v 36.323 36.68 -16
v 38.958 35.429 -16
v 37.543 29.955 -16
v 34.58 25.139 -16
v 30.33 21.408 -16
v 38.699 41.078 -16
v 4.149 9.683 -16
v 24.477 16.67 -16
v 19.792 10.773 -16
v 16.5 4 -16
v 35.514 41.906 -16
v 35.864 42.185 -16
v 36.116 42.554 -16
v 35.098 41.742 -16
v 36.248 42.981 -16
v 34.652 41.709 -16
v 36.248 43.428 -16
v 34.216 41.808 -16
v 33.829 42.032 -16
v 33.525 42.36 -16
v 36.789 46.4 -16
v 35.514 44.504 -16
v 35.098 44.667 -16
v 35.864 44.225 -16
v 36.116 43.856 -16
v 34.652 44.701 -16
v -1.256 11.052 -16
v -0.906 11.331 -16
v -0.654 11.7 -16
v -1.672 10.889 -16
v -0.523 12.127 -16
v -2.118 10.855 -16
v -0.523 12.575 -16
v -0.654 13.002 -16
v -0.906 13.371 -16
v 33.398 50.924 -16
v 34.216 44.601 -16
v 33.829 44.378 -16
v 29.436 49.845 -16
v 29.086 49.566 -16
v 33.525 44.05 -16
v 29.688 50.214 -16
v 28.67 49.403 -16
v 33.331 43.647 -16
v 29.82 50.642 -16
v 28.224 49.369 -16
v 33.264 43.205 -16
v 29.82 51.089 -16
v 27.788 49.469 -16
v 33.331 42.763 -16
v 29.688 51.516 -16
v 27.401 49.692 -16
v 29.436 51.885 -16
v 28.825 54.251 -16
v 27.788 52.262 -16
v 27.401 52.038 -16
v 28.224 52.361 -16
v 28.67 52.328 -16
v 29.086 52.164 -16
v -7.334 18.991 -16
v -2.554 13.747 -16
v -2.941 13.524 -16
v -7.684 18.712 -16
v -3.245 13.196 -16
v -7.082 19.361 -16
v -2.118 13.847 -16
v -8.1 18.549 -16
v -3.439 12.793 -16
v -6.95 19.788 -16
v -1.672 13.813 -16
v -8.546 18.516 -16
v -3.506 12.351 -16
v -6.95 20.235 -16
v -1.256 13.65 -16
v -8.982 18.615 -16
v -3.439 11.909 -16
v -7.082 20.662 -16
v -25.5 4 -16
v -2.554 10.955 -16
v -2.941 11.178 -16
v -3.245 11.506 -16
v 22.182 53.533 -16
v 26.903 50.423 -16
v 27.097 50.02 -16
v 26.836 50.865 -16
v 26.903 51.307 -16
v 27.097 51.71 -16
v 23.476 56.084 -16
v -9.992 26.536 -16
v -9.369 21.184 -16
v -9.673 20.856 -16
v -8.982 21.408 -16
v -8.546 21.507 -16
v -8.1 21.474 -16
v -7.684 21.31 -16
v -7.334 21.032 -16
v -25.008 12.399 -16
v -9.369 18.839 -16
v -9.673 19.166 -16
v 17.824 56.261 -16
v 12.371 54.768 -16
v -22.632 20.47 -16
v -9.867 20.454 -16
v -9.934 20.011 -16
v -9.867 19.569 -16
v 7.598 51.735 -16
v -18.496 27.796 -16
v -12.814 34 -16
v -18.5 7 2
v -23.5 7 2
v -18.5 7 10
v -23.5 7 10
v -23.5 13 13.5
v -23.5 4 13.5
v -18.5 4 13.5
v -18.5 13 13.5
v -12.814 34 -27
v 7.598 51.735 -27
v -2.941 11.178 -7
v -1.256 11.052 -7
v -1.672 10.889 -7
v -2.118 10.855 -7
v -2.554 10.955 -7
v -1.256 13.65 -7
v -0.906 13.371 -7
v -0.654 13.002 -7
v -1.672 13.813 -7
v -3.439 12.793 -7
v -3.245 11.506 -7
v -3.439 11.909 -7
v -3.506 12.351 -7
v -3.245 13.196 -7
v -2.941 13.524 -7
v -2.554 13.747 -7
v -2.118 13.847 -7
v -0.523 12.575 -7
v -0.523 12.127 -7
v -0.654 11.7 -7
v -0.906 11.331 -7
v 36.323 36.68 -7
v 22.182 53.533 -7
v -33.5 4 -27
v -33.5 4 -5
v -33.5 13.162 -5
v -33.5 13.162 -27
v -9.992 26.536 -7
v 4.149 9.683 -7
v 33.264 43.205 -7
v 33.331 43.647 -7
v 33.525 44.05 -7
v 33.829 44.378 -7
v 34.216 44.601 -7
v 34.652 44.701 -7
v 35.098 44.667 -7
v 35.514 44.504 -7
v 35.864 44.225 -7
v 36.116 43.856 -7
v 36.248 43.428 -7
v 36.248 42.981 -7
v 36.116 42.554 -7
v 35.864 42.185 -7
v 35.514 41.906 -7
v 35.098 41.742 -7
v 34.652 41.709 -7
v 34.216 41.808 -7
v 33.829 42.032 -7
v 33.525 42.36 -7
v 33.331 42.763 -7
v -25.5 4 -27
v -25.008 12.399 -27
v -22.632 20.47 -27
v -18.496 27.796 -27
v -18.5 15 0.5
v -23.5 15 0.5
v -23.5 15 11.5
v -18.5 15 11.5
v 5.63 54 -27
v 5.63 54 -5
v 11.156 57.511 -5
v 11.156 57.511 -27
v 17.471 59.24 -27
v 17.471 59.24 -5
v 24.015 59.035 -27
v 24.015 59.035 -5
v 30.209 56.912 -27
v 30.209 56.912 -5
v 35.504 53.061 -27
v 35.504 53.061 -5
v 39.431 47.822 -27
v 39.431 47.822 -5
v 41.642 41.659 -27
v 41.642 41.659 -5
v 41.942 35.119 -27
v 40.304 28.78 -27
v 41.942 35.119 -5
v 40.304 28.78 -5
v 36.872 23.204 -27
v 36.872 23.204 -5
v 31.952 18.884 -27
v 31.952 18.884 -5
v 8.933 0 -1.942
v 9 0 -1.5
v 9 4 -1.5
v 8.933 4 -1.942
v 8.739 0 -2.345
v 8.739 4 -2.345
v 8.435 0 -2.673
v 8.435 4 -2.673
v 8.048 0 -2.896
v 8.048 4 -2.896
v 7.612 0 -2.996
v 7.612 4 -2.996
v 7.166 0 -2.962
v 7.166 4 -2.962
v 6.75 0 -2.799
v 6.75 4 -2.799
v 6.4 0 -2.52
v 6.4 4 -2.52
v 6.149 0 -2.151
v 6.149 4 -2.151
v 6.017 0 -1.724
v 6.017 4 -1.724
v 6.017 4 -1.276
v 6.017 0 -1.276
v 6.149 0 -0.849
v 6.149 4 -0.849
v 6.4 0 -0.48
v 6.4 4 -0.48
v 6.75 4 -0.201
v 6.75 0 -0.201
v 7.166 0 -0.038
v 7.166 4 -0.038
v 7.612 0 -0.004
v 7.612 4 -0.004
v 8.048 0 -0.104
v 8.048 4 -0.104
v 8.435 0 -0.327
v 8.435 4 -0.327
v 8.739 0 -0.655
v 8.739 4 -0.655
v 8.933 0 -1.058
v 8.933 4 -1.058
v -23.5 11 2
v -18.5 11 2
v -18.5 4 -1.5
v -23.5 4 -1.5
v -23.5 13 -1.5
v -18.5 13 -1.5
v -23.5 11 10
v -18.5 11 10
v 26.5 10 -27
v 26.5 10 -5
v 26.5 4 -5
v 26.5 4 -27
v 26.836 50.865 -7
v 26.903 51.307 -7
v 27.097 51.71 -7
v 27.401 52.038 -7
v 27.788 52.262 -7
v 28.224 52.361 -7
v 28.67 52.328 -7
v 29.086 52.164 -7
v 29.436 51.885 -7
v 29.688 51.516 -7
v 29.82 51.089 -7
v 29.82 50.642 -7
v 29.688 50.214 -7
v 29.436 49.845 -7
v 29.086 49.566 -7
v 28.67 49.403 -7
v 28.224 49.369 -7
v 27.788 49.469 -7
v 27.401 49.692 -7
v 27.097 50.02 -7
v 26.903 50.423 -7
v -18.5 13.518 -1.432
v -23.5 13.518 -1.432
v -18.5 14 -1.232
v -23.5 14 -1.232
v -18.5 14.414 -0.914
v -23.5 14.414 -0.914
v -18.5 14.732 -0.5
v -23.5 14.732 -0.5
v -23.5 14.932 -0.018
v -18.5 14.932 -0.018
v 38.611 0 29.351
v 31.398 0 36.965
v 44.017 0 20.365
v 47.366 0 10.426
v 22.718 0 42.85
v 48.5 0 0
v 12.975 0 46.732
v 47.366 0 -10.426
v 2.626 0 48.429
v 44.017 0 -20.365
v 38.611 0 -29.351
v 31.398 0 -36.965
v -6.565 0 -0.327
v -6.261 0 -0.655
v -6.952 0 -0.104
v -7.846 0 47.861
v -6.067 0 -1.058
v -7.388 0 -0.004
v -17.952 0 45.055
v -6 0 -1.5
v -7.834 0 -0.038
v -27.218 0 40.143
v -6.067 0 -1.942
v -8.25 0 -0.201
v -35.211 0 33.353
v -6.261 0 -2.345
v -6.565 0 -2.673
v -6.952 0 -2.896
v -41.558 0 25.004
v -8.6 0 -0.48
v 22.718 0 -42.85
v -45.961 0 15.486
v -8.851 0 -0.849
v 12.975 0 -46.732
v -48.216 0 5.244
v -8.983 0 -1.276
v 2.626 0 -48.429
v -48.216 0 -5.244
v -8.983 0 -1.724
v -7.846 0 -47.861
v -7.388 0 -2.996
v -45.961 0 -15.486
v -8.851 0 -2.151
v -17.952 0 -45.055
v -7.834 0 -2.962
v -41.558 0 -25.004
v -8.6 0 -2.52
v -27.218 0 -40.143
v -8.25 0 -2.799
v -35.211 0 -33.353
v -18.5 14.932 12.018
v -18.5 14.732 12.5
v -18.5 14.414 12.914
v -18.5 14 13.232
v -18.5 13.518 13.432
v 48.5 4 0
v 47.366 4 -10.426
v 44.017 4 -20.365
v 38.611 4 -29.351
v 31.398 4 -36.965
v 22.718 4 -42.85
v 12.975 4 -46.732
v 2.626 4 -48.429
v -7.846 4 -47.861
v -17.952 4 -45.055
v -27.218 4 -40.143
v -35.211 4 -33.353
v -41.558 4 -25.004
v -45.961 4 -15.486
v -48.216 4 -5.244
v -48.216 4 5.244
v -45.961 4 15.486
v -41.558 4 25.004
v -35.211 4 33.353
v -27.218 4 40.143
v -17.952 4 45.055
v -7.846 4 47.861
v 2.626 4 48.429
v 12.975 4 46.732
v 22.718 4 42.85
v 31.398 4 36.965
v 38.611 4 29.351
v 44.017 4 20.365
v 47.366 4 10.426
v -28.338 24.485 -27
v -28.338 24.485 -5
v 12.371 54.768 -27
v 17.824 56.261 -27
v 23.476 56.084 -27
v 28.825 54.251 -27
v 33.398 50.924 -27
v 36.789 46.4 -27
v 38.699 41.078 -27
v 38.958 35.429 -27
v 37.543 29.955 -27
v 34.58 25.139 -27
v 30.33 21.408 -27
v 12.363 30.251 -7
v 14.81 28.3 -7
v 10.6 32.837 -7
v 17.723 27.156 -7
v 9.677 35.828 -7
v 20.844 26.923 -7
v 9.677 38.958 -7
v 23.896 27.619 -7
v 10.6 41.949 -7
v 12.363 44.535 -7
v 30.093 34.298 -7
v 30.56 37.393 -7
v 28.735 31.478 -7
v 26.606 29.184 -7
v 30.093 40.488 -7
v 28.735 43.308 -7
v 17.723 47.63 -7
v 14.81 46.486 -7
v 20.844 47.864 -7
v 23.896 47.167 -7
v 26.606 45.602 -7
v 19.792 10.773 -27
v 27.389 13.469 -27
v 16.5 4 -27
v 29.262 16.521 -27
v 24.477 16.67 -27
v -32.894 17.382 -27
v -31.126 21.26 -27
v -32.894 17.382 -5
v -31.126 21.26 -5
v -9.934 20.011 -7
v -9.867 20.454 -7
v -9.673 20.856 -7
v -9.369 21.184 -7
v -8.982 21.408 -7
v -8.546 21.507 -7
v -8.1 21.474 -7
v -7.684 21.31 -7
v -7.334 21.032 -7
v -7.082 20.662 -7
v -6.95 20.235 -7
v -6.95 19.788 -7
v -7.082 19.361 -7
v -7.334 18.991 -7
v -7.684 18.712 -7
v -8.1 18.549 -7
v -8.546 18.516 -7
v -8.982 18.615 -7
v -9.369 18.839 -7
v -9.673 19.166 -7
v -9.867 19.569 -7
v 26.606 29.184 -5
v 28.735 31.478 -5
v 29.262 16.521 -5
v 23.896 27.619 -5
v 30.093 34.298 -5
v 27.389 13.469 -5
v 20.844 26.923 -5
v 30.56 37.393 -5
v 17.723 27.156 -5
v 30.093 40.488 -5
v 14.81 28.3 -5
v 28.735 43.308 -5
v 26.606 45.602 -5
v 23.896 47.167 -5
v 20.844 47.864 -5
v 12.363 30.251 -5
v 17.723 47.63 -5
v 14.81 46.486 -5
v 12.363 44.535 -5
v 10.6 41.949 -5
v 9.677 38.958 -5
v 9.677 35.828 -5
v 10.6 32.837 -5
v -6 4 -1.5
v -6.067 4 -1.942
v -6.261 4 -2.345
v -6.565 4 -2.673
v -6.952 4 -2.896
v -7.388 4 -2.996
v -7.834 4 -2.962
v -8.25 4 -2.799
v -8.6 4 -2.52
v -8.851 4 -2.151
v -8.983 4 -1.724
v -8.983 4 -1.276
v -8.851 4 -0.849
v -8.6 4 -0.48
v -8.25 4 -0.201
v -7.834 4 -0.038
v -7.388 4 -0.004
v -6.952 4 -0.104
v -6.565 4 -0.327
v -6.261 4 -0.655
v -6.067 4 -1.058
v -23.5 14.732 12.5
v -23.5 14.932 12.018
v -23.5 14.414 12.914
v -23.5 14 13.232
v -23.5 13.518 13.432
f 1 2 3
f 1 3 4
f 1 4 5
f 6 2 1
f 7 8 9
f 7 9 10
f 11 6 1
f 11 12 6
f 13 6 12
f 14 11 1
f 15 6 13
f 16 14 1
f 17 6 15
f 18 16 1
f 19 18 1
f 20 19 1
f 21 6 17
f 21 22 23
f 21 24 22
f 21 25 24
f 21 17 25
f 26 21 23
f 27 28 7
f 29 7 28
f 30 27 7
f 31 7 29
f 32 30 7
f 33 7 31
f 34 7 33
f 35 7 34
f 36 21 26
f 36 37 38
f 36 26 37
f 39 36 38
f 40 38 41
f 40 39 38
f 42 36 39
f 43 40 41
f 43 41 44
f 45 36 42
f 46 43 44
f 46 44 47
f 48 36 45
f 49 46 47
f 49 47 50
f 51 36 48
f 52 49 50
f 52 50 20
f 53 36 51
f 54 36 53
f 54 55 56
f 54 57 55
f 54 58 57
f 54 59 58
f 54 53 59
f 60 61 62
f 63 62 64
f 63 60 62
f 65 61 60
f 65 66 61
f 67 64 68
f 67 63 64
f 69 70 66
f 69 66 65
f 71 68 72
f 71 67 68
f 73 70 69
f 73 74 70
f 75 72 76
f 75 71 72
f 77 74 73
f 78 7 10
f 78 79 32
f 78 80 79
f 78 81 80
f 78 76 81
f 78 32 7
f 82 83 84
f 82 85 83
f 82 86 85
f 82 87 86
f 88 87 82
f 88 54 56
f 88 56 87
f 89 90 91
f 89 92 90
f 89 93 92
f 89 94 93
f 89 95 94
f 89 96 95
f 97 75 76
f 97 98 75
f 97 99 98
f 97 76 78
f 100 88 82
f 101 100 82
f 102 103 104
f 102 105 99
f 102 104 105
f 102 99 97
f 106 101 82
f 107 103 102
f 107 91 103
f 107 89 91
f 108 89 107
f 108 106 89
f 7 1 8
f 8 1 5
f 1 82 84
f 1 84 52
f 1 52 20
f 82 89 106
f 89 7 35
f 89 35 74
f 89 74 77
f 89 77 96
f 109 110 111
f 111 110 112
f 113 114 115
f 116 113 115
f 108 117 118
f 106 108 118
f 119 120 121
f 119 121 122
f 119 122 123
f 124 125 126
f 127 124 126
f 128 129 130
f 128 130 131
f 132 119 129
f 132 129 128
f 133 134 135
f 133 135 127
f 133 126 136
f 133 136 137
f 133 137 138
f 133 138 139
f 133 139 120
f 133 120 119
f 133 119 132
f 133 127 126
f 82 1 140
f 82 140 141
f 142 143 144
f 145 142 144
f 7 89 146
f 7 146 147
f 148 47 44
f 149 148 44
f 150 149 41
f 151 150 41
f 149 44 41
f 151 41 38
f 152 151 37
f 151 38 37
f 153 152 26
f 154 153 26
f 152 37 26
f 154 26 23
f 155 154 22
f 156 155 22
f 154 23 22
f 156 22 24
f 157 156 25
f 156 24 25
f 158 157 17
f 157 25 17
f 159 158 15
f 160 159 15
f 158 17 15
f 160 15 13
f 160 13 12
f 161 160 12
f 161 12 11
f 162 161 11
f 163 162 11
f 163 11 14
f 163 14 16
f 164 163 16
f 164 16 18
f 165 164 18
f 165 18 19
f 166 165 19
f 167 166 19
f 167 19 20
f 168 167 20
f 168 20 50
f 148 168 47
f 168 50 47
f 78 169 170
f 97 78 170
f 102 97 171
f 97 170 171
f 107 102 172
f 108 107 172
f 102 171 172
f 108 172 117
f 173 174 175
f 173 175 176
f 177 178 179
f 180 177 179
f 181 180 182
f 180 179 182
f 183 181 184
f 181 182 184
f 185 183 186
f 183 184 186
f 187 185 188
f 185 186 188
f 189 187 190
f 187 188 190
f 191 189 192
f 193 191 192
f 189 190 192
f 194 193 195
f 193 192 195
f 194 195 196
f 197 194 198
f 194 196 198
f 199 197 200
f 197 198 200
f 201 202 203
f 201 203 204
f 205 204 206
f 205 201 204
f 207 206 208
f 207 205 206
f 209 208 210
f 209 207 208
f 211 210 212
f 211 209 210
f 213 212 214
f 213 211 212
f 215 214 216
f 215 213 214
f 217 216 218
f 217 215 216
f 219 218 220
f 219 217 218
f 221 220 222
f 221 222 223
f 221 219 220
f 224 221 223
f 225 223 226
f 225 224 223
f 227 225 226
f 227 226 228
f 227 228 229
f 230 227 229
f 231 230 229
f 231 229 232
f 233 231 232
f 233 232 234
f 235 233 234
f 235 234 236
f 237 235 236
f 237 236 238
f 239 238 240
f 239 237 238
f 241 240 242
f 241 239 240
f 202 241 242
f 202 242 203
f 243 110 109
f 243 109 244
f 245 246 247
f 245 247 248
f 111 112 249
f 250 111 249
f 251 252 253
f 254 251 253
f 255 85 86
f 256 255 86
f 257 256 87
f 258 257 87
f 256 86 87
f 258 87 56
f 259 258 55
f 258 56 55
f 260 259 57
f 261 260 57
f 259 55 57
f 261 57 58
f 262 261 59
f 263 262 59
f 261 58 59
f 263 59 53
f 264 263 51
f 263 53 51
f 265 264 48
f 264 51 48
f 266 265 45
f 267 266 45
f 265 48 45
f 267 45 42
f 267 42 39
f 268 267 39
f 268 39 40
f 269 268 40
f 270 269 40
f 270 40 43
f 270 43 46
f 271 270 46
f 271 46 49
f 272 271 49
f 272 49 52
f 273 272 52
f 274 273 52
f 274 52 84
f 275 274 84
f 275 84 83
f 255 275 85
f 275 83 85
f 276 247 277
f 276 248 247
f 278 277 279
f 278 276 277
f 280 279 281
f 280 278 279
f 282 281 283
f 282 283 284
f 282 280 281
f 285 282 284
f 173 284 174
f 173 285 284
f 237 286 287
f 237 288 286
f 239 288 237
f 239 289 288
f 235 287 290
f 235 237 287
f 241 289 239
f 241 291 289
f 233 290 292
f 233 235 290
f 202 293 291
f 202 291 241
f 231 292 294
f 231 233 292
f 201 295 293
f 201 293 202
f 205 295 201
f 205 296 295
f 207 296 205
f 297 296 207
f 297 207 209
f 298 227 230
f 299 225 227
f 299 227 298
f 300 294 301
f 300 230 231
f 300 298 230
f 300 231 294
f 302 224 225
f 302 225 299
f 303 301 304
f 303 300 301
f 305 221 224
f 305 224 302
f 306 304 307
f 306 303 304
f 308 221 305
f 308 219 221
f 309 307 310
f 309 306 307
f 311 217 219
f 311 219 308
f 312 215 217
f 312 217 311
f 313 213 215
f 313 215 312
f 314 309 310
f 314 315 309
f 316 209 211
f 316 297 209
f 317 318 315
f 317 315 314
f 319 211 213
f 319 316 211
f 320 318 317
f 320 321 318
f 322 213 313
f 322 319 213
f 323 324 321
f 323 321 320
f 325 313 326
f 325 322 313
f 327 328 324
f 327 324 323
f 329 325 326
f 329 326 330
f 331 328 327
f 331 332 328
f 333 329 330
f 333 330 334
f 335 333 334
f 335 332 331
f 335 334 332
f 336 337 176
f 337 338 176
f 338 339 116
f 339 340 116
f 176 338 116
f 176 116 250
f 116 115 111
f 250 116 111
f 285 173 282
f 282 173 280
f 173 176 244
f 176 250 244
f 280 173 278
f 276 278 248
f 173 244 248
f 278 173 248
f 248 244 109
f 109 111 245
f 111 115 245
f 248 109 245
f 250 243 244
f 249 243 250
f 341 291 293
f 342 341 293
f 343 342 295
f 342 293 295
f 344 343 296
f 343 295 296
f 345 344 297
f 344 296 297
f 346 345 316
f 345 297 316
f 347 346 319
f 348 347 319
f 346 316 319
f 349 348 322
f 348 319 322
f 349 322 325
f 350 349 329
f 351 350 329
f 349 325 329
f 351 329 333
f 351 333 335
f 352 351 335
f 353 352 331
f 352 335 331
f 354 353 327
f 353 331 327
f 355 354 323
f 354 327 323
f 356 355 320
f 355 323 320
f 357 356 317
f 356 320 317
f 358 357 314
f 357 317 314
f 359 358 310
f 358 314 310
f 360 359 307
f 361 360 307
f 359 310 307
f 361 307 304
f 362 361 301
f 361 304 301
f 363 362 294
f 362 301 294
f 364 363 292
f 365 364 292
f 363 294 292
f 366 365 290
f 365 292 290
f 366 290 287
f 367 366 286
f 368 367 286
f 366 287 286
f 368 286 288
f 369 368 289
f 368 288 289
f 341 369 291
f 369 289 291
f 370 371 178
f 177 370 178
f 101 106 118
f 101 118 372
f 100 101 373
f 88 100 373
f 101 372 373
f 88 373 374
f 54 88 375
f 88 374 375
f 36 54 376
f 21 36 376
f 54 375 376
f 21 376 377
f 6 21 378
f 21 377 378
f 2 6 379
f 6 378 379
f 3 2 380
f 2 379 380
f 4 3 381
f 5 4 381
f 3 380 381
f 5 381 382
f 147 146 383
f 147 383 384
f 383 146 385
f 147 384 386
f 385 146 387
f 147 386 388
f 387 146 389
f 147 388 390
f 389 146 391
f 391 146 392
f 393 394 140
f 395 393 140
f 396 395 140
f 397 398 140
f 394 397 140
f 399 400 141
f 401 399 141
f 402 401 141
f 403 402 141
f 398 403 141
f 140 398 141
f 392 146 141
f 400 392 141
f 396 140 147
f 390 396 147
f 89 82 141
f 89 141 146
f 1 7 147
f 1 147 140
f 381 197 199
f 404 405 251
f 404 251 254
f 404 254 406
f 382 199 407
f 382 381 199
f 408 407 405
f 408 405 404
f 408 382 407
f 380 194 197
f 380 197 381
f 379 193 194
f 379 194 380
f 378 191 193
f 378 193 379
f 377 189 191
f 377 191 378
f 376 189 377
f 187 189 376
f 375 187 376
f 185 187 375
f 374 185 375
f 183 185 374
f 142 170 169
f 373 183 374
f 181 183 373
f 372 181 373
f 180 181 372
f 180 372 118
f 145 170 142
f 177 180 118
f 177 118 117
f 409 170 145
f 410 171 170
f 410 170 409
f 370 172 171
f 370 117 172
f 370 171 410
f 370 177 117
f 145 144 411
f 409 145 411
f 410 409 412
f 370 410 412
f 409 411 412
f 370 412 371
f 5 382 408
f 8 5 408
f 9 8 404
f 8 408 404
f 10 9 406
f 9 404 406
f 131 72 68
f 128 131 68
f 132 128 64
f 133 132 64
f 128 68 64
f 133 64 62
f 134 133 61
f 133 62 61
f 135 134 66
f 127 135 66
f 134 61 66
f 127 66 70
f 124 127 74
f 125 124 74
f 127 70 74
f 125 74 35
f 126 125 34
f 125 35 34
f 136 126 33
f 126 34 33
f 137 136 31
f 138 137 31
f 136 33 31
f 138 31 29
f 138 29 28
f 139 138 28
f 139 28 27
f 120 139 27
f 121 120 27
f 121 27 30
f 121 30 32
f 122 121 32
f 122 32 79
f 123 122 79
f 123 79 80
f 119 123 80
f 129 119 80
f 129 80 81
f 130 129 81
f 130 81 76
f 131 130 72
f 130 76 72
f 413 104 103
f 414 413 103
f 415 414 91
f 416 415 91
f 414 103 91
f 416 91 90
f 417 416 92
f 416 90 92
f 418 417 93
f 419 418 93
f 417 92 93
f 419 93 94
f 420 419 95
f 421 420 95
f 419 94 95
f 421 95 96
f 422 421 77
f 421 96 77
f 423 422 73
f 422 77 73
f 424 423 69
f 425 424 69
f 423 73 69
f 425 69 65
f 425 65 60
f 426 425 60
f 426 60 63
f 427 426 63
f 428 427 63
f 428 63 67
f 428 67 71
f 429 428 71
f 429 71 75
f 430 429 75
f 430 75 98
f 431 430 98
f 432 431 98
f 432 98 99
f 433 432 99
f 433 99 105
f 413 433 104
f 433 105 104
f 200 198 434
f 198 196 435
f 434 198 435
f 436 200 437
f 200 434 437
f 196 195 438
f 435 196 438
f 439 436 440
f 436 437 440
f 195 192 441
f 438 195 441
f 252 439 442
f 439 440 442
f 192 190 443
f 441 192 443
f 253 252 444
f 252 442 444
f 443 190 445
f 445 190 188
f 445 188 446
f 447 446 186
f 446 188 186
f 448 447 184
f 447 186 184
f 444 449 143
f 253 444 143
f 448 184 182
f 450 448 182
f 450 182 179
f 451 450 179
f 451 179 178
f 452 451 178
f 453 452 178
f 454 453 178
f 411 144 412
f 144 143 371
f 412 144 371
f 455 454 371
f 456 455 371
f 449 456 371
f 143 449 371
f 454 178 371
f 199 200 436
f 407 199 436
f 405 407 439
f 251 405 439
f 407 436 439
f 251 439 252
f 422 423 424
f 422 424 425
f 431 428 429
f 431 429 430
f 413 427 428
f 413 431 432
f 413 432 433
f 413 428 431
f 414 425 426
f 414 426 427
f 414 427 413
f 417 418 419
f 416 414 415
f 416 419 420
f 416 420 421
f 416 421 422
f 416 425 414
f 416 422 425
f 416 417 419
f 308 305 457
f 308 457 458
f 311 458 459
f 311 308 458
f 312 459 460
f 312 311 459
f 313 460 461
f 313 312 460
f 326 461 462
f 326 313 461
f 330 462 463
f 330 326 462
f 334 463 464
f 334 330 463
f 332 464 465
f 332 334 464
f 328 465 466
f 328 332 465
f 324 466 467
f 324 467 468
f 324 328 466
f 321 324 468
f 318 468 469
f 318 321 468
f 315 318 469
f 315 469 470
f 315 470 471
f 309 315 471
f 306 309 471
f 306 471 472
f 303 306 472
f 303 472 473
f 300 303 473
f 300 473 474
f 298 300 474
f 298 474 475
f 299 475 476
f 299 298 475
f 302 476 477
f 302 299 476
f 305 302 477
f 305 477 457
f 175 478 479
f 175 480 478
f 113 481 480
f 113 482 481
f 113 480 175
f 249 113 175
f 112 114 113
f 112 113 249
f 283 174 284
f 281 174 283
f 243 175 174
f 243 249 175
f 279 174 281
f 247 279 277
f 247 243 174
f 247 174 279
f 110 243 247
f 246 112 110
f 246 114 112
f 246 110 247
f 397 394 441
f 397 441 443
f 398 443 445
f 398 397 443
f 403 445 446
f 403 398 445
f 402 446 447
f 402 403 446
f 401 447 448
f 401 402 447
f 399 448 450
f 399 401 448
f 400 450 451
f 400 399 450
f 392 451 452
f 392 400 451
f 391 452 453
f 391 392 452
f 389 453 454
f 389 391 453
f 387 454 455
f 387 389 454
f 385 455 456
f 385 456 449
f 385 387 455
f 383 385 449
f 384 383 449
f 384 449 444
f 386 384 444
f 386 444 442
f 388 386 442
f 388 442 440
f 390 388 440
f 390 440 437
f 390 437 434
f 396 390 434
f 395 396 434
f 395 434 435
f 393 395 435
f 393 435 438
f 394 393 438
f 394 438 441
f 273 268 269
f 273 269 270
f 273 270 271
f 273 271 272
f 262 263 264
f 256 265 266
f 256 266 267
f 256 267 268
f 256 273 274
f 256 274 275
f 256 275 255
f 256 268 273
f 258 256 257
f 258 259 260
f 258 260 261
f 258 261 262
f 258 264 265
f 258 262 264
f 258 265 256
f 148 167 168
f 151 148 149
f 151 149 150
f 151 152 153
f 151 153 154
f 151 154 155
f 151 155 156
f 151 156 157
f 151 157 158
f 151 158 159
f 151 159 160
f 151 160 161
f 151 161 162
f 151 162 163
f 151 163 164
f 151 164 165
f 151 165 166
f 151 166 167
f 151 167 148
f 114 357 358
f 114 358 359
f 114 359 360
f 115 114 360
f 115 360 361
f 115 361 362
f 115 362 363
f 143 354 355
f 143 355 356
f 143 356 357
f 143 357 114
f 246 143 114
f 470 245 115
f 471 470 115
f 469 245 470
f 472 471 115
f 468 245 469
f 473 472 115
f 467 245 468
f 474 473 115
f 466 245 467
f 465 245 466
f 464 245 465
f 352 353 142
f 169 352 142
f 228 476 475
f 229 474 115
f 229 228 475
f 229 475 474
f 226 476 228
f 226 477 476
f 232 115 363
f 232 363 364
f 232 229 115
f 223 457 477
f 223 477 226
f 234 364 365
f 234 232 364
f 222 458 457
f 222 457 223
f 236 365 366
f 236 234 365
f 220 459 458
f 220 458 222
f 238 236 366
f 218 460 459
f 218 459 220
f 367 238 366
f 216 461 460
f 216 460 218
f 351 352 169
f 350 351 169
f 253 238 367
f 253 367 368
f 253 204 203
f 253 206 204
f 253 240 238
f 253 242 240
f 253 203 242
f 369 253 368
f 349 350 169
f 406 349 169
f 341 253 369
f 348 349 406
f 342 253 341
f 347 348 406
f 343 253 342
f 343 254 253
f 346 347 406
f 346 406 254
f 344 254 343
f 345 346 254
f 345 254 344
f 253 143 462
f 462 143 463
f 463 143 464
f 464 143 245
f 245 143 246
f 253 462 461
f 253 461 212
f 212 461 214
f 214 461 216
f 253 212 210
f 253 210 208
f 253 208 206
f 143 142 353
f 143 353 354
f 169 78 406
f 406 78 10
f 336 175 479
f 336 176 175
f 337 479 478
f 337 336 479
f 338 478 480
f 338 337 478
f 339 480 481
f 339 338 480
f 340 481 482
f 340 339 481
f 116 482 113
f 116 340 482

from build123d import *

# Parameters (mm, degrees)
SKETCH1_R               = 48.5
SKETCH1_R_2             = 1.5
SKETCH1_W               = 5
SKETCH1_H               = 15
BOSS_EXTRUDE1_DEPTH     = 4
SKETCH1_4_W             = 5
SKETCH1_4_H             = 15
BOSS_EXTRUDE2_DEPTH     = 15
FILLET1_R               = 2
EXTRUDE_THIN1_DEPTH     = 11
SKETCH3_4_R             = 10.5
BOSS_EXTRUDE3_DEPTH     = 11
CUT_EXTRUDE2_DEPTH      = 11
SKETCH8_R               = 1.5
CUT_EXTRUDE3_DEPTH      = 9
SKETCH9_W               = 8
SKETCH9_H               = 4
CUT_EXTRUDE4_DEPTH      = 26
CUT_EXTRUDE4_DEPTH_BACK = 73


with BuildPart() as part:
    # Sketch1 → Boss-Extrude1 (new body)
    with BuildSketch(Plane(origin=(0, 0, 0), x_dir=(1, 0, 0), z_dir=(0, 1, 0))):
        Circle(SKETCH1_R)
        with Locations((7.5, 1.5)):
            Circle(SKETCH1_R_2, mode=Mode.SUBTRACT)
        with Locations((-7.5, 1.5)):
            Circle(SKETCH1_R_2, mode=Mode.SUBTRACT)
        with Locations((-21, -6)):
            Rectangle(SKETCH1_W, SKETCH1_H, mode=Mode.SUBTRACT)
    extrude(amount=BOSS_EXTRUDE1_DEPTH)

    # Sketch1<4> → Boss-Extrude2 (add)
    with BuildSketch(Plane(origin=(0, 0, 0), x_dir=(1, 0, 0), z_dir=(0, 1, 0))):
        with Locations((-21, -6)):
            Rectangle(SKETCH1_4_W, SKETCH1_4_H)
    extrude(amount=BOSS_EXTRUDE2_DEPTH)

    # Fillet1
    fillet1_edges = [part.edges().sort_by_distance(p)[0] for p in [
        (-21, 15, -1.5),
        (-21, 15, 13.5),
    ]]
    fillet(fillet1_edges, radius=FILLET1_R)

    # Sketch3 → Extrude-Thin1 (add, symmetric)
    with BuildSketch(Plane.XY.offset(-16)):
        with BuildLine():
            Line((-33.5, 0), (-33.5, 13.162084514))
            ThreePointArc((-33.5, 13.162084514), (-32.148724822, 19.384006302), (-28.338358569, 24.484924294))
            Line((-28.338358569, 24.484924294), (5.63016077, 54))
            ThreePointArc((5.63016077, 54), (37.663321214, 50.588409815), (31.952020166, 18.884413917))
            ThreePointArc((31.952020166, 18.884413917), (28.210951689, 15.065108917), (26.5, 10))
            Line((26.5, 10), (26.5, 0))
            Line((26.5, 0), (16.5, 0))
            Line((16.5, 0), (16.5, 10.429751474))
            ThreePointArc((16.5, 10.429751474), (19.537286112, 20.046443985), (26.546444335, 27.297484102))
            ThreePointArc((26.546444335, 27.297484102), (29.661699452, 44.590572773), (12.189066483, 46.451440147))
            Line((12.189066483, 46.451440147), (-21.779452856, 16.936364441))
            ThreePointArc((-21.779452856, 16.936364441), (-23.049574941, 15.236058444), (-23.5, 13.162084514))
            Line((-23.5, 13.162084514), (-23.5, 0))
            Line((-23.5, 0), (-33.5, 0))
        make_face()
    extrude(amount=EXTRUDE_THIN1_DEPTH, both=True)

    # Sketch3<4> → Boss-Extrude3 (add)
    with BuildSketch(Plane.XY.offset(-16)):
        with BuildLine():
            Line((-33.5, 0), (-33.5, 13.162084514))
            ThreePointArc((-33.5, 13.162084514), (-32.148724822, 19.384006302), (-28.338358569, 24.484924294))
            Line((-28.338358569, 24.484924294), (5.63016077, 54))
            ThreePointArc((5.63016077, 54), (37.663321214, 50.588409815), (31.952020166, 18.884413917))
            ThreePointArc((31.952020166, 18.884413917), (28.210951689, 15.065108917), (26.5, 10))
            Line((26.5, 10), (26.5, 0))
            Line((26.5, 0), (-33.5, 0))
        make_face()
        with Locations((20.059753337, 37.393168323)):
            Circle(SKETCH3_4_R, mode=Mode.SUBTRACT)
    extrude(amount=BOSS_EXTRUDE3_DEPTH)

    # Sketch5 → Cut-Extrude2 (cut)
    with BuildSketch(Plane(origin=(0, 0, -27), x_dir=(-1, 0, 0), z_dir=(0, 0, -1))):
        with BuildLine():
            Line((-16.5, 4), (25.5, 4))
            ThreePointArc((25.5, 4), (22.632303684, 20.469705569), (12.81364714, 34))
            Line((12.81364714, 34), (-7.597832484, 51.735432044))
            ThreePointArc((-7.597832484, 51.735432044), (-35.262834685, 48.789058703), (-30.330347417, 21.408334972))
            ThreePointArc((-30.330347417, 21.408334972), (-21.973239319, 13.849736754), (-16.5, 4))
        make_face()
    extrude(amount=-CUT_EXTRUDE2_DEPTH, mode=Mode.SUBTRACT)

    # Sketch8 → Cut-Extrude3 (cut)
    with BuildSketch(Plane(origin=(0, 0, -16), x_dir=(-1, 0, 0), z_dir=(0, 0, -1))):
        with Locations((-34.764358033, 43.204760253)):
            Circle(SKETCH8_R)
        with Locations((-28.336481936, 50.865204684)):
            Circle(SKETCH8_R)
        with Locations((8.433651334, 20.011399419)):
            Circle(SKETCH8_R)
        with Locations((2.005775237, 12.350954988)):
            Circle(SKETCH8_R)
        Polygon((-36.322950361, 36.680130765), (-22.181622948, 53.533108514), (9.992243663, 26.536028907), (-4.14908375, 9.683051158), align=None)
    extrude(amount=-CUT_EXTRUDE3_DEPTH, mode=Mode.SUBTRACT)

    # Sketch9 → Cut-Extrude4 (cut, two sides)
    with BuildSketch(Plane.ZY.offset(23.5)) as cut_extrude4_sk:
        with Locations((6, 9)):
            Rectangle(SKETCH9_W, SKETCH9_H)
    extrude(amount=CUT_EXTRUDE4_DEPTH, mode=Mode.SUBTRACT)
    extrude(cut_extrude4_sk.sketch, amount=-CUT_EXTRUDE4_DEPTH_BACK, mode=Mode.SUBTRACT)


solid = part.part
